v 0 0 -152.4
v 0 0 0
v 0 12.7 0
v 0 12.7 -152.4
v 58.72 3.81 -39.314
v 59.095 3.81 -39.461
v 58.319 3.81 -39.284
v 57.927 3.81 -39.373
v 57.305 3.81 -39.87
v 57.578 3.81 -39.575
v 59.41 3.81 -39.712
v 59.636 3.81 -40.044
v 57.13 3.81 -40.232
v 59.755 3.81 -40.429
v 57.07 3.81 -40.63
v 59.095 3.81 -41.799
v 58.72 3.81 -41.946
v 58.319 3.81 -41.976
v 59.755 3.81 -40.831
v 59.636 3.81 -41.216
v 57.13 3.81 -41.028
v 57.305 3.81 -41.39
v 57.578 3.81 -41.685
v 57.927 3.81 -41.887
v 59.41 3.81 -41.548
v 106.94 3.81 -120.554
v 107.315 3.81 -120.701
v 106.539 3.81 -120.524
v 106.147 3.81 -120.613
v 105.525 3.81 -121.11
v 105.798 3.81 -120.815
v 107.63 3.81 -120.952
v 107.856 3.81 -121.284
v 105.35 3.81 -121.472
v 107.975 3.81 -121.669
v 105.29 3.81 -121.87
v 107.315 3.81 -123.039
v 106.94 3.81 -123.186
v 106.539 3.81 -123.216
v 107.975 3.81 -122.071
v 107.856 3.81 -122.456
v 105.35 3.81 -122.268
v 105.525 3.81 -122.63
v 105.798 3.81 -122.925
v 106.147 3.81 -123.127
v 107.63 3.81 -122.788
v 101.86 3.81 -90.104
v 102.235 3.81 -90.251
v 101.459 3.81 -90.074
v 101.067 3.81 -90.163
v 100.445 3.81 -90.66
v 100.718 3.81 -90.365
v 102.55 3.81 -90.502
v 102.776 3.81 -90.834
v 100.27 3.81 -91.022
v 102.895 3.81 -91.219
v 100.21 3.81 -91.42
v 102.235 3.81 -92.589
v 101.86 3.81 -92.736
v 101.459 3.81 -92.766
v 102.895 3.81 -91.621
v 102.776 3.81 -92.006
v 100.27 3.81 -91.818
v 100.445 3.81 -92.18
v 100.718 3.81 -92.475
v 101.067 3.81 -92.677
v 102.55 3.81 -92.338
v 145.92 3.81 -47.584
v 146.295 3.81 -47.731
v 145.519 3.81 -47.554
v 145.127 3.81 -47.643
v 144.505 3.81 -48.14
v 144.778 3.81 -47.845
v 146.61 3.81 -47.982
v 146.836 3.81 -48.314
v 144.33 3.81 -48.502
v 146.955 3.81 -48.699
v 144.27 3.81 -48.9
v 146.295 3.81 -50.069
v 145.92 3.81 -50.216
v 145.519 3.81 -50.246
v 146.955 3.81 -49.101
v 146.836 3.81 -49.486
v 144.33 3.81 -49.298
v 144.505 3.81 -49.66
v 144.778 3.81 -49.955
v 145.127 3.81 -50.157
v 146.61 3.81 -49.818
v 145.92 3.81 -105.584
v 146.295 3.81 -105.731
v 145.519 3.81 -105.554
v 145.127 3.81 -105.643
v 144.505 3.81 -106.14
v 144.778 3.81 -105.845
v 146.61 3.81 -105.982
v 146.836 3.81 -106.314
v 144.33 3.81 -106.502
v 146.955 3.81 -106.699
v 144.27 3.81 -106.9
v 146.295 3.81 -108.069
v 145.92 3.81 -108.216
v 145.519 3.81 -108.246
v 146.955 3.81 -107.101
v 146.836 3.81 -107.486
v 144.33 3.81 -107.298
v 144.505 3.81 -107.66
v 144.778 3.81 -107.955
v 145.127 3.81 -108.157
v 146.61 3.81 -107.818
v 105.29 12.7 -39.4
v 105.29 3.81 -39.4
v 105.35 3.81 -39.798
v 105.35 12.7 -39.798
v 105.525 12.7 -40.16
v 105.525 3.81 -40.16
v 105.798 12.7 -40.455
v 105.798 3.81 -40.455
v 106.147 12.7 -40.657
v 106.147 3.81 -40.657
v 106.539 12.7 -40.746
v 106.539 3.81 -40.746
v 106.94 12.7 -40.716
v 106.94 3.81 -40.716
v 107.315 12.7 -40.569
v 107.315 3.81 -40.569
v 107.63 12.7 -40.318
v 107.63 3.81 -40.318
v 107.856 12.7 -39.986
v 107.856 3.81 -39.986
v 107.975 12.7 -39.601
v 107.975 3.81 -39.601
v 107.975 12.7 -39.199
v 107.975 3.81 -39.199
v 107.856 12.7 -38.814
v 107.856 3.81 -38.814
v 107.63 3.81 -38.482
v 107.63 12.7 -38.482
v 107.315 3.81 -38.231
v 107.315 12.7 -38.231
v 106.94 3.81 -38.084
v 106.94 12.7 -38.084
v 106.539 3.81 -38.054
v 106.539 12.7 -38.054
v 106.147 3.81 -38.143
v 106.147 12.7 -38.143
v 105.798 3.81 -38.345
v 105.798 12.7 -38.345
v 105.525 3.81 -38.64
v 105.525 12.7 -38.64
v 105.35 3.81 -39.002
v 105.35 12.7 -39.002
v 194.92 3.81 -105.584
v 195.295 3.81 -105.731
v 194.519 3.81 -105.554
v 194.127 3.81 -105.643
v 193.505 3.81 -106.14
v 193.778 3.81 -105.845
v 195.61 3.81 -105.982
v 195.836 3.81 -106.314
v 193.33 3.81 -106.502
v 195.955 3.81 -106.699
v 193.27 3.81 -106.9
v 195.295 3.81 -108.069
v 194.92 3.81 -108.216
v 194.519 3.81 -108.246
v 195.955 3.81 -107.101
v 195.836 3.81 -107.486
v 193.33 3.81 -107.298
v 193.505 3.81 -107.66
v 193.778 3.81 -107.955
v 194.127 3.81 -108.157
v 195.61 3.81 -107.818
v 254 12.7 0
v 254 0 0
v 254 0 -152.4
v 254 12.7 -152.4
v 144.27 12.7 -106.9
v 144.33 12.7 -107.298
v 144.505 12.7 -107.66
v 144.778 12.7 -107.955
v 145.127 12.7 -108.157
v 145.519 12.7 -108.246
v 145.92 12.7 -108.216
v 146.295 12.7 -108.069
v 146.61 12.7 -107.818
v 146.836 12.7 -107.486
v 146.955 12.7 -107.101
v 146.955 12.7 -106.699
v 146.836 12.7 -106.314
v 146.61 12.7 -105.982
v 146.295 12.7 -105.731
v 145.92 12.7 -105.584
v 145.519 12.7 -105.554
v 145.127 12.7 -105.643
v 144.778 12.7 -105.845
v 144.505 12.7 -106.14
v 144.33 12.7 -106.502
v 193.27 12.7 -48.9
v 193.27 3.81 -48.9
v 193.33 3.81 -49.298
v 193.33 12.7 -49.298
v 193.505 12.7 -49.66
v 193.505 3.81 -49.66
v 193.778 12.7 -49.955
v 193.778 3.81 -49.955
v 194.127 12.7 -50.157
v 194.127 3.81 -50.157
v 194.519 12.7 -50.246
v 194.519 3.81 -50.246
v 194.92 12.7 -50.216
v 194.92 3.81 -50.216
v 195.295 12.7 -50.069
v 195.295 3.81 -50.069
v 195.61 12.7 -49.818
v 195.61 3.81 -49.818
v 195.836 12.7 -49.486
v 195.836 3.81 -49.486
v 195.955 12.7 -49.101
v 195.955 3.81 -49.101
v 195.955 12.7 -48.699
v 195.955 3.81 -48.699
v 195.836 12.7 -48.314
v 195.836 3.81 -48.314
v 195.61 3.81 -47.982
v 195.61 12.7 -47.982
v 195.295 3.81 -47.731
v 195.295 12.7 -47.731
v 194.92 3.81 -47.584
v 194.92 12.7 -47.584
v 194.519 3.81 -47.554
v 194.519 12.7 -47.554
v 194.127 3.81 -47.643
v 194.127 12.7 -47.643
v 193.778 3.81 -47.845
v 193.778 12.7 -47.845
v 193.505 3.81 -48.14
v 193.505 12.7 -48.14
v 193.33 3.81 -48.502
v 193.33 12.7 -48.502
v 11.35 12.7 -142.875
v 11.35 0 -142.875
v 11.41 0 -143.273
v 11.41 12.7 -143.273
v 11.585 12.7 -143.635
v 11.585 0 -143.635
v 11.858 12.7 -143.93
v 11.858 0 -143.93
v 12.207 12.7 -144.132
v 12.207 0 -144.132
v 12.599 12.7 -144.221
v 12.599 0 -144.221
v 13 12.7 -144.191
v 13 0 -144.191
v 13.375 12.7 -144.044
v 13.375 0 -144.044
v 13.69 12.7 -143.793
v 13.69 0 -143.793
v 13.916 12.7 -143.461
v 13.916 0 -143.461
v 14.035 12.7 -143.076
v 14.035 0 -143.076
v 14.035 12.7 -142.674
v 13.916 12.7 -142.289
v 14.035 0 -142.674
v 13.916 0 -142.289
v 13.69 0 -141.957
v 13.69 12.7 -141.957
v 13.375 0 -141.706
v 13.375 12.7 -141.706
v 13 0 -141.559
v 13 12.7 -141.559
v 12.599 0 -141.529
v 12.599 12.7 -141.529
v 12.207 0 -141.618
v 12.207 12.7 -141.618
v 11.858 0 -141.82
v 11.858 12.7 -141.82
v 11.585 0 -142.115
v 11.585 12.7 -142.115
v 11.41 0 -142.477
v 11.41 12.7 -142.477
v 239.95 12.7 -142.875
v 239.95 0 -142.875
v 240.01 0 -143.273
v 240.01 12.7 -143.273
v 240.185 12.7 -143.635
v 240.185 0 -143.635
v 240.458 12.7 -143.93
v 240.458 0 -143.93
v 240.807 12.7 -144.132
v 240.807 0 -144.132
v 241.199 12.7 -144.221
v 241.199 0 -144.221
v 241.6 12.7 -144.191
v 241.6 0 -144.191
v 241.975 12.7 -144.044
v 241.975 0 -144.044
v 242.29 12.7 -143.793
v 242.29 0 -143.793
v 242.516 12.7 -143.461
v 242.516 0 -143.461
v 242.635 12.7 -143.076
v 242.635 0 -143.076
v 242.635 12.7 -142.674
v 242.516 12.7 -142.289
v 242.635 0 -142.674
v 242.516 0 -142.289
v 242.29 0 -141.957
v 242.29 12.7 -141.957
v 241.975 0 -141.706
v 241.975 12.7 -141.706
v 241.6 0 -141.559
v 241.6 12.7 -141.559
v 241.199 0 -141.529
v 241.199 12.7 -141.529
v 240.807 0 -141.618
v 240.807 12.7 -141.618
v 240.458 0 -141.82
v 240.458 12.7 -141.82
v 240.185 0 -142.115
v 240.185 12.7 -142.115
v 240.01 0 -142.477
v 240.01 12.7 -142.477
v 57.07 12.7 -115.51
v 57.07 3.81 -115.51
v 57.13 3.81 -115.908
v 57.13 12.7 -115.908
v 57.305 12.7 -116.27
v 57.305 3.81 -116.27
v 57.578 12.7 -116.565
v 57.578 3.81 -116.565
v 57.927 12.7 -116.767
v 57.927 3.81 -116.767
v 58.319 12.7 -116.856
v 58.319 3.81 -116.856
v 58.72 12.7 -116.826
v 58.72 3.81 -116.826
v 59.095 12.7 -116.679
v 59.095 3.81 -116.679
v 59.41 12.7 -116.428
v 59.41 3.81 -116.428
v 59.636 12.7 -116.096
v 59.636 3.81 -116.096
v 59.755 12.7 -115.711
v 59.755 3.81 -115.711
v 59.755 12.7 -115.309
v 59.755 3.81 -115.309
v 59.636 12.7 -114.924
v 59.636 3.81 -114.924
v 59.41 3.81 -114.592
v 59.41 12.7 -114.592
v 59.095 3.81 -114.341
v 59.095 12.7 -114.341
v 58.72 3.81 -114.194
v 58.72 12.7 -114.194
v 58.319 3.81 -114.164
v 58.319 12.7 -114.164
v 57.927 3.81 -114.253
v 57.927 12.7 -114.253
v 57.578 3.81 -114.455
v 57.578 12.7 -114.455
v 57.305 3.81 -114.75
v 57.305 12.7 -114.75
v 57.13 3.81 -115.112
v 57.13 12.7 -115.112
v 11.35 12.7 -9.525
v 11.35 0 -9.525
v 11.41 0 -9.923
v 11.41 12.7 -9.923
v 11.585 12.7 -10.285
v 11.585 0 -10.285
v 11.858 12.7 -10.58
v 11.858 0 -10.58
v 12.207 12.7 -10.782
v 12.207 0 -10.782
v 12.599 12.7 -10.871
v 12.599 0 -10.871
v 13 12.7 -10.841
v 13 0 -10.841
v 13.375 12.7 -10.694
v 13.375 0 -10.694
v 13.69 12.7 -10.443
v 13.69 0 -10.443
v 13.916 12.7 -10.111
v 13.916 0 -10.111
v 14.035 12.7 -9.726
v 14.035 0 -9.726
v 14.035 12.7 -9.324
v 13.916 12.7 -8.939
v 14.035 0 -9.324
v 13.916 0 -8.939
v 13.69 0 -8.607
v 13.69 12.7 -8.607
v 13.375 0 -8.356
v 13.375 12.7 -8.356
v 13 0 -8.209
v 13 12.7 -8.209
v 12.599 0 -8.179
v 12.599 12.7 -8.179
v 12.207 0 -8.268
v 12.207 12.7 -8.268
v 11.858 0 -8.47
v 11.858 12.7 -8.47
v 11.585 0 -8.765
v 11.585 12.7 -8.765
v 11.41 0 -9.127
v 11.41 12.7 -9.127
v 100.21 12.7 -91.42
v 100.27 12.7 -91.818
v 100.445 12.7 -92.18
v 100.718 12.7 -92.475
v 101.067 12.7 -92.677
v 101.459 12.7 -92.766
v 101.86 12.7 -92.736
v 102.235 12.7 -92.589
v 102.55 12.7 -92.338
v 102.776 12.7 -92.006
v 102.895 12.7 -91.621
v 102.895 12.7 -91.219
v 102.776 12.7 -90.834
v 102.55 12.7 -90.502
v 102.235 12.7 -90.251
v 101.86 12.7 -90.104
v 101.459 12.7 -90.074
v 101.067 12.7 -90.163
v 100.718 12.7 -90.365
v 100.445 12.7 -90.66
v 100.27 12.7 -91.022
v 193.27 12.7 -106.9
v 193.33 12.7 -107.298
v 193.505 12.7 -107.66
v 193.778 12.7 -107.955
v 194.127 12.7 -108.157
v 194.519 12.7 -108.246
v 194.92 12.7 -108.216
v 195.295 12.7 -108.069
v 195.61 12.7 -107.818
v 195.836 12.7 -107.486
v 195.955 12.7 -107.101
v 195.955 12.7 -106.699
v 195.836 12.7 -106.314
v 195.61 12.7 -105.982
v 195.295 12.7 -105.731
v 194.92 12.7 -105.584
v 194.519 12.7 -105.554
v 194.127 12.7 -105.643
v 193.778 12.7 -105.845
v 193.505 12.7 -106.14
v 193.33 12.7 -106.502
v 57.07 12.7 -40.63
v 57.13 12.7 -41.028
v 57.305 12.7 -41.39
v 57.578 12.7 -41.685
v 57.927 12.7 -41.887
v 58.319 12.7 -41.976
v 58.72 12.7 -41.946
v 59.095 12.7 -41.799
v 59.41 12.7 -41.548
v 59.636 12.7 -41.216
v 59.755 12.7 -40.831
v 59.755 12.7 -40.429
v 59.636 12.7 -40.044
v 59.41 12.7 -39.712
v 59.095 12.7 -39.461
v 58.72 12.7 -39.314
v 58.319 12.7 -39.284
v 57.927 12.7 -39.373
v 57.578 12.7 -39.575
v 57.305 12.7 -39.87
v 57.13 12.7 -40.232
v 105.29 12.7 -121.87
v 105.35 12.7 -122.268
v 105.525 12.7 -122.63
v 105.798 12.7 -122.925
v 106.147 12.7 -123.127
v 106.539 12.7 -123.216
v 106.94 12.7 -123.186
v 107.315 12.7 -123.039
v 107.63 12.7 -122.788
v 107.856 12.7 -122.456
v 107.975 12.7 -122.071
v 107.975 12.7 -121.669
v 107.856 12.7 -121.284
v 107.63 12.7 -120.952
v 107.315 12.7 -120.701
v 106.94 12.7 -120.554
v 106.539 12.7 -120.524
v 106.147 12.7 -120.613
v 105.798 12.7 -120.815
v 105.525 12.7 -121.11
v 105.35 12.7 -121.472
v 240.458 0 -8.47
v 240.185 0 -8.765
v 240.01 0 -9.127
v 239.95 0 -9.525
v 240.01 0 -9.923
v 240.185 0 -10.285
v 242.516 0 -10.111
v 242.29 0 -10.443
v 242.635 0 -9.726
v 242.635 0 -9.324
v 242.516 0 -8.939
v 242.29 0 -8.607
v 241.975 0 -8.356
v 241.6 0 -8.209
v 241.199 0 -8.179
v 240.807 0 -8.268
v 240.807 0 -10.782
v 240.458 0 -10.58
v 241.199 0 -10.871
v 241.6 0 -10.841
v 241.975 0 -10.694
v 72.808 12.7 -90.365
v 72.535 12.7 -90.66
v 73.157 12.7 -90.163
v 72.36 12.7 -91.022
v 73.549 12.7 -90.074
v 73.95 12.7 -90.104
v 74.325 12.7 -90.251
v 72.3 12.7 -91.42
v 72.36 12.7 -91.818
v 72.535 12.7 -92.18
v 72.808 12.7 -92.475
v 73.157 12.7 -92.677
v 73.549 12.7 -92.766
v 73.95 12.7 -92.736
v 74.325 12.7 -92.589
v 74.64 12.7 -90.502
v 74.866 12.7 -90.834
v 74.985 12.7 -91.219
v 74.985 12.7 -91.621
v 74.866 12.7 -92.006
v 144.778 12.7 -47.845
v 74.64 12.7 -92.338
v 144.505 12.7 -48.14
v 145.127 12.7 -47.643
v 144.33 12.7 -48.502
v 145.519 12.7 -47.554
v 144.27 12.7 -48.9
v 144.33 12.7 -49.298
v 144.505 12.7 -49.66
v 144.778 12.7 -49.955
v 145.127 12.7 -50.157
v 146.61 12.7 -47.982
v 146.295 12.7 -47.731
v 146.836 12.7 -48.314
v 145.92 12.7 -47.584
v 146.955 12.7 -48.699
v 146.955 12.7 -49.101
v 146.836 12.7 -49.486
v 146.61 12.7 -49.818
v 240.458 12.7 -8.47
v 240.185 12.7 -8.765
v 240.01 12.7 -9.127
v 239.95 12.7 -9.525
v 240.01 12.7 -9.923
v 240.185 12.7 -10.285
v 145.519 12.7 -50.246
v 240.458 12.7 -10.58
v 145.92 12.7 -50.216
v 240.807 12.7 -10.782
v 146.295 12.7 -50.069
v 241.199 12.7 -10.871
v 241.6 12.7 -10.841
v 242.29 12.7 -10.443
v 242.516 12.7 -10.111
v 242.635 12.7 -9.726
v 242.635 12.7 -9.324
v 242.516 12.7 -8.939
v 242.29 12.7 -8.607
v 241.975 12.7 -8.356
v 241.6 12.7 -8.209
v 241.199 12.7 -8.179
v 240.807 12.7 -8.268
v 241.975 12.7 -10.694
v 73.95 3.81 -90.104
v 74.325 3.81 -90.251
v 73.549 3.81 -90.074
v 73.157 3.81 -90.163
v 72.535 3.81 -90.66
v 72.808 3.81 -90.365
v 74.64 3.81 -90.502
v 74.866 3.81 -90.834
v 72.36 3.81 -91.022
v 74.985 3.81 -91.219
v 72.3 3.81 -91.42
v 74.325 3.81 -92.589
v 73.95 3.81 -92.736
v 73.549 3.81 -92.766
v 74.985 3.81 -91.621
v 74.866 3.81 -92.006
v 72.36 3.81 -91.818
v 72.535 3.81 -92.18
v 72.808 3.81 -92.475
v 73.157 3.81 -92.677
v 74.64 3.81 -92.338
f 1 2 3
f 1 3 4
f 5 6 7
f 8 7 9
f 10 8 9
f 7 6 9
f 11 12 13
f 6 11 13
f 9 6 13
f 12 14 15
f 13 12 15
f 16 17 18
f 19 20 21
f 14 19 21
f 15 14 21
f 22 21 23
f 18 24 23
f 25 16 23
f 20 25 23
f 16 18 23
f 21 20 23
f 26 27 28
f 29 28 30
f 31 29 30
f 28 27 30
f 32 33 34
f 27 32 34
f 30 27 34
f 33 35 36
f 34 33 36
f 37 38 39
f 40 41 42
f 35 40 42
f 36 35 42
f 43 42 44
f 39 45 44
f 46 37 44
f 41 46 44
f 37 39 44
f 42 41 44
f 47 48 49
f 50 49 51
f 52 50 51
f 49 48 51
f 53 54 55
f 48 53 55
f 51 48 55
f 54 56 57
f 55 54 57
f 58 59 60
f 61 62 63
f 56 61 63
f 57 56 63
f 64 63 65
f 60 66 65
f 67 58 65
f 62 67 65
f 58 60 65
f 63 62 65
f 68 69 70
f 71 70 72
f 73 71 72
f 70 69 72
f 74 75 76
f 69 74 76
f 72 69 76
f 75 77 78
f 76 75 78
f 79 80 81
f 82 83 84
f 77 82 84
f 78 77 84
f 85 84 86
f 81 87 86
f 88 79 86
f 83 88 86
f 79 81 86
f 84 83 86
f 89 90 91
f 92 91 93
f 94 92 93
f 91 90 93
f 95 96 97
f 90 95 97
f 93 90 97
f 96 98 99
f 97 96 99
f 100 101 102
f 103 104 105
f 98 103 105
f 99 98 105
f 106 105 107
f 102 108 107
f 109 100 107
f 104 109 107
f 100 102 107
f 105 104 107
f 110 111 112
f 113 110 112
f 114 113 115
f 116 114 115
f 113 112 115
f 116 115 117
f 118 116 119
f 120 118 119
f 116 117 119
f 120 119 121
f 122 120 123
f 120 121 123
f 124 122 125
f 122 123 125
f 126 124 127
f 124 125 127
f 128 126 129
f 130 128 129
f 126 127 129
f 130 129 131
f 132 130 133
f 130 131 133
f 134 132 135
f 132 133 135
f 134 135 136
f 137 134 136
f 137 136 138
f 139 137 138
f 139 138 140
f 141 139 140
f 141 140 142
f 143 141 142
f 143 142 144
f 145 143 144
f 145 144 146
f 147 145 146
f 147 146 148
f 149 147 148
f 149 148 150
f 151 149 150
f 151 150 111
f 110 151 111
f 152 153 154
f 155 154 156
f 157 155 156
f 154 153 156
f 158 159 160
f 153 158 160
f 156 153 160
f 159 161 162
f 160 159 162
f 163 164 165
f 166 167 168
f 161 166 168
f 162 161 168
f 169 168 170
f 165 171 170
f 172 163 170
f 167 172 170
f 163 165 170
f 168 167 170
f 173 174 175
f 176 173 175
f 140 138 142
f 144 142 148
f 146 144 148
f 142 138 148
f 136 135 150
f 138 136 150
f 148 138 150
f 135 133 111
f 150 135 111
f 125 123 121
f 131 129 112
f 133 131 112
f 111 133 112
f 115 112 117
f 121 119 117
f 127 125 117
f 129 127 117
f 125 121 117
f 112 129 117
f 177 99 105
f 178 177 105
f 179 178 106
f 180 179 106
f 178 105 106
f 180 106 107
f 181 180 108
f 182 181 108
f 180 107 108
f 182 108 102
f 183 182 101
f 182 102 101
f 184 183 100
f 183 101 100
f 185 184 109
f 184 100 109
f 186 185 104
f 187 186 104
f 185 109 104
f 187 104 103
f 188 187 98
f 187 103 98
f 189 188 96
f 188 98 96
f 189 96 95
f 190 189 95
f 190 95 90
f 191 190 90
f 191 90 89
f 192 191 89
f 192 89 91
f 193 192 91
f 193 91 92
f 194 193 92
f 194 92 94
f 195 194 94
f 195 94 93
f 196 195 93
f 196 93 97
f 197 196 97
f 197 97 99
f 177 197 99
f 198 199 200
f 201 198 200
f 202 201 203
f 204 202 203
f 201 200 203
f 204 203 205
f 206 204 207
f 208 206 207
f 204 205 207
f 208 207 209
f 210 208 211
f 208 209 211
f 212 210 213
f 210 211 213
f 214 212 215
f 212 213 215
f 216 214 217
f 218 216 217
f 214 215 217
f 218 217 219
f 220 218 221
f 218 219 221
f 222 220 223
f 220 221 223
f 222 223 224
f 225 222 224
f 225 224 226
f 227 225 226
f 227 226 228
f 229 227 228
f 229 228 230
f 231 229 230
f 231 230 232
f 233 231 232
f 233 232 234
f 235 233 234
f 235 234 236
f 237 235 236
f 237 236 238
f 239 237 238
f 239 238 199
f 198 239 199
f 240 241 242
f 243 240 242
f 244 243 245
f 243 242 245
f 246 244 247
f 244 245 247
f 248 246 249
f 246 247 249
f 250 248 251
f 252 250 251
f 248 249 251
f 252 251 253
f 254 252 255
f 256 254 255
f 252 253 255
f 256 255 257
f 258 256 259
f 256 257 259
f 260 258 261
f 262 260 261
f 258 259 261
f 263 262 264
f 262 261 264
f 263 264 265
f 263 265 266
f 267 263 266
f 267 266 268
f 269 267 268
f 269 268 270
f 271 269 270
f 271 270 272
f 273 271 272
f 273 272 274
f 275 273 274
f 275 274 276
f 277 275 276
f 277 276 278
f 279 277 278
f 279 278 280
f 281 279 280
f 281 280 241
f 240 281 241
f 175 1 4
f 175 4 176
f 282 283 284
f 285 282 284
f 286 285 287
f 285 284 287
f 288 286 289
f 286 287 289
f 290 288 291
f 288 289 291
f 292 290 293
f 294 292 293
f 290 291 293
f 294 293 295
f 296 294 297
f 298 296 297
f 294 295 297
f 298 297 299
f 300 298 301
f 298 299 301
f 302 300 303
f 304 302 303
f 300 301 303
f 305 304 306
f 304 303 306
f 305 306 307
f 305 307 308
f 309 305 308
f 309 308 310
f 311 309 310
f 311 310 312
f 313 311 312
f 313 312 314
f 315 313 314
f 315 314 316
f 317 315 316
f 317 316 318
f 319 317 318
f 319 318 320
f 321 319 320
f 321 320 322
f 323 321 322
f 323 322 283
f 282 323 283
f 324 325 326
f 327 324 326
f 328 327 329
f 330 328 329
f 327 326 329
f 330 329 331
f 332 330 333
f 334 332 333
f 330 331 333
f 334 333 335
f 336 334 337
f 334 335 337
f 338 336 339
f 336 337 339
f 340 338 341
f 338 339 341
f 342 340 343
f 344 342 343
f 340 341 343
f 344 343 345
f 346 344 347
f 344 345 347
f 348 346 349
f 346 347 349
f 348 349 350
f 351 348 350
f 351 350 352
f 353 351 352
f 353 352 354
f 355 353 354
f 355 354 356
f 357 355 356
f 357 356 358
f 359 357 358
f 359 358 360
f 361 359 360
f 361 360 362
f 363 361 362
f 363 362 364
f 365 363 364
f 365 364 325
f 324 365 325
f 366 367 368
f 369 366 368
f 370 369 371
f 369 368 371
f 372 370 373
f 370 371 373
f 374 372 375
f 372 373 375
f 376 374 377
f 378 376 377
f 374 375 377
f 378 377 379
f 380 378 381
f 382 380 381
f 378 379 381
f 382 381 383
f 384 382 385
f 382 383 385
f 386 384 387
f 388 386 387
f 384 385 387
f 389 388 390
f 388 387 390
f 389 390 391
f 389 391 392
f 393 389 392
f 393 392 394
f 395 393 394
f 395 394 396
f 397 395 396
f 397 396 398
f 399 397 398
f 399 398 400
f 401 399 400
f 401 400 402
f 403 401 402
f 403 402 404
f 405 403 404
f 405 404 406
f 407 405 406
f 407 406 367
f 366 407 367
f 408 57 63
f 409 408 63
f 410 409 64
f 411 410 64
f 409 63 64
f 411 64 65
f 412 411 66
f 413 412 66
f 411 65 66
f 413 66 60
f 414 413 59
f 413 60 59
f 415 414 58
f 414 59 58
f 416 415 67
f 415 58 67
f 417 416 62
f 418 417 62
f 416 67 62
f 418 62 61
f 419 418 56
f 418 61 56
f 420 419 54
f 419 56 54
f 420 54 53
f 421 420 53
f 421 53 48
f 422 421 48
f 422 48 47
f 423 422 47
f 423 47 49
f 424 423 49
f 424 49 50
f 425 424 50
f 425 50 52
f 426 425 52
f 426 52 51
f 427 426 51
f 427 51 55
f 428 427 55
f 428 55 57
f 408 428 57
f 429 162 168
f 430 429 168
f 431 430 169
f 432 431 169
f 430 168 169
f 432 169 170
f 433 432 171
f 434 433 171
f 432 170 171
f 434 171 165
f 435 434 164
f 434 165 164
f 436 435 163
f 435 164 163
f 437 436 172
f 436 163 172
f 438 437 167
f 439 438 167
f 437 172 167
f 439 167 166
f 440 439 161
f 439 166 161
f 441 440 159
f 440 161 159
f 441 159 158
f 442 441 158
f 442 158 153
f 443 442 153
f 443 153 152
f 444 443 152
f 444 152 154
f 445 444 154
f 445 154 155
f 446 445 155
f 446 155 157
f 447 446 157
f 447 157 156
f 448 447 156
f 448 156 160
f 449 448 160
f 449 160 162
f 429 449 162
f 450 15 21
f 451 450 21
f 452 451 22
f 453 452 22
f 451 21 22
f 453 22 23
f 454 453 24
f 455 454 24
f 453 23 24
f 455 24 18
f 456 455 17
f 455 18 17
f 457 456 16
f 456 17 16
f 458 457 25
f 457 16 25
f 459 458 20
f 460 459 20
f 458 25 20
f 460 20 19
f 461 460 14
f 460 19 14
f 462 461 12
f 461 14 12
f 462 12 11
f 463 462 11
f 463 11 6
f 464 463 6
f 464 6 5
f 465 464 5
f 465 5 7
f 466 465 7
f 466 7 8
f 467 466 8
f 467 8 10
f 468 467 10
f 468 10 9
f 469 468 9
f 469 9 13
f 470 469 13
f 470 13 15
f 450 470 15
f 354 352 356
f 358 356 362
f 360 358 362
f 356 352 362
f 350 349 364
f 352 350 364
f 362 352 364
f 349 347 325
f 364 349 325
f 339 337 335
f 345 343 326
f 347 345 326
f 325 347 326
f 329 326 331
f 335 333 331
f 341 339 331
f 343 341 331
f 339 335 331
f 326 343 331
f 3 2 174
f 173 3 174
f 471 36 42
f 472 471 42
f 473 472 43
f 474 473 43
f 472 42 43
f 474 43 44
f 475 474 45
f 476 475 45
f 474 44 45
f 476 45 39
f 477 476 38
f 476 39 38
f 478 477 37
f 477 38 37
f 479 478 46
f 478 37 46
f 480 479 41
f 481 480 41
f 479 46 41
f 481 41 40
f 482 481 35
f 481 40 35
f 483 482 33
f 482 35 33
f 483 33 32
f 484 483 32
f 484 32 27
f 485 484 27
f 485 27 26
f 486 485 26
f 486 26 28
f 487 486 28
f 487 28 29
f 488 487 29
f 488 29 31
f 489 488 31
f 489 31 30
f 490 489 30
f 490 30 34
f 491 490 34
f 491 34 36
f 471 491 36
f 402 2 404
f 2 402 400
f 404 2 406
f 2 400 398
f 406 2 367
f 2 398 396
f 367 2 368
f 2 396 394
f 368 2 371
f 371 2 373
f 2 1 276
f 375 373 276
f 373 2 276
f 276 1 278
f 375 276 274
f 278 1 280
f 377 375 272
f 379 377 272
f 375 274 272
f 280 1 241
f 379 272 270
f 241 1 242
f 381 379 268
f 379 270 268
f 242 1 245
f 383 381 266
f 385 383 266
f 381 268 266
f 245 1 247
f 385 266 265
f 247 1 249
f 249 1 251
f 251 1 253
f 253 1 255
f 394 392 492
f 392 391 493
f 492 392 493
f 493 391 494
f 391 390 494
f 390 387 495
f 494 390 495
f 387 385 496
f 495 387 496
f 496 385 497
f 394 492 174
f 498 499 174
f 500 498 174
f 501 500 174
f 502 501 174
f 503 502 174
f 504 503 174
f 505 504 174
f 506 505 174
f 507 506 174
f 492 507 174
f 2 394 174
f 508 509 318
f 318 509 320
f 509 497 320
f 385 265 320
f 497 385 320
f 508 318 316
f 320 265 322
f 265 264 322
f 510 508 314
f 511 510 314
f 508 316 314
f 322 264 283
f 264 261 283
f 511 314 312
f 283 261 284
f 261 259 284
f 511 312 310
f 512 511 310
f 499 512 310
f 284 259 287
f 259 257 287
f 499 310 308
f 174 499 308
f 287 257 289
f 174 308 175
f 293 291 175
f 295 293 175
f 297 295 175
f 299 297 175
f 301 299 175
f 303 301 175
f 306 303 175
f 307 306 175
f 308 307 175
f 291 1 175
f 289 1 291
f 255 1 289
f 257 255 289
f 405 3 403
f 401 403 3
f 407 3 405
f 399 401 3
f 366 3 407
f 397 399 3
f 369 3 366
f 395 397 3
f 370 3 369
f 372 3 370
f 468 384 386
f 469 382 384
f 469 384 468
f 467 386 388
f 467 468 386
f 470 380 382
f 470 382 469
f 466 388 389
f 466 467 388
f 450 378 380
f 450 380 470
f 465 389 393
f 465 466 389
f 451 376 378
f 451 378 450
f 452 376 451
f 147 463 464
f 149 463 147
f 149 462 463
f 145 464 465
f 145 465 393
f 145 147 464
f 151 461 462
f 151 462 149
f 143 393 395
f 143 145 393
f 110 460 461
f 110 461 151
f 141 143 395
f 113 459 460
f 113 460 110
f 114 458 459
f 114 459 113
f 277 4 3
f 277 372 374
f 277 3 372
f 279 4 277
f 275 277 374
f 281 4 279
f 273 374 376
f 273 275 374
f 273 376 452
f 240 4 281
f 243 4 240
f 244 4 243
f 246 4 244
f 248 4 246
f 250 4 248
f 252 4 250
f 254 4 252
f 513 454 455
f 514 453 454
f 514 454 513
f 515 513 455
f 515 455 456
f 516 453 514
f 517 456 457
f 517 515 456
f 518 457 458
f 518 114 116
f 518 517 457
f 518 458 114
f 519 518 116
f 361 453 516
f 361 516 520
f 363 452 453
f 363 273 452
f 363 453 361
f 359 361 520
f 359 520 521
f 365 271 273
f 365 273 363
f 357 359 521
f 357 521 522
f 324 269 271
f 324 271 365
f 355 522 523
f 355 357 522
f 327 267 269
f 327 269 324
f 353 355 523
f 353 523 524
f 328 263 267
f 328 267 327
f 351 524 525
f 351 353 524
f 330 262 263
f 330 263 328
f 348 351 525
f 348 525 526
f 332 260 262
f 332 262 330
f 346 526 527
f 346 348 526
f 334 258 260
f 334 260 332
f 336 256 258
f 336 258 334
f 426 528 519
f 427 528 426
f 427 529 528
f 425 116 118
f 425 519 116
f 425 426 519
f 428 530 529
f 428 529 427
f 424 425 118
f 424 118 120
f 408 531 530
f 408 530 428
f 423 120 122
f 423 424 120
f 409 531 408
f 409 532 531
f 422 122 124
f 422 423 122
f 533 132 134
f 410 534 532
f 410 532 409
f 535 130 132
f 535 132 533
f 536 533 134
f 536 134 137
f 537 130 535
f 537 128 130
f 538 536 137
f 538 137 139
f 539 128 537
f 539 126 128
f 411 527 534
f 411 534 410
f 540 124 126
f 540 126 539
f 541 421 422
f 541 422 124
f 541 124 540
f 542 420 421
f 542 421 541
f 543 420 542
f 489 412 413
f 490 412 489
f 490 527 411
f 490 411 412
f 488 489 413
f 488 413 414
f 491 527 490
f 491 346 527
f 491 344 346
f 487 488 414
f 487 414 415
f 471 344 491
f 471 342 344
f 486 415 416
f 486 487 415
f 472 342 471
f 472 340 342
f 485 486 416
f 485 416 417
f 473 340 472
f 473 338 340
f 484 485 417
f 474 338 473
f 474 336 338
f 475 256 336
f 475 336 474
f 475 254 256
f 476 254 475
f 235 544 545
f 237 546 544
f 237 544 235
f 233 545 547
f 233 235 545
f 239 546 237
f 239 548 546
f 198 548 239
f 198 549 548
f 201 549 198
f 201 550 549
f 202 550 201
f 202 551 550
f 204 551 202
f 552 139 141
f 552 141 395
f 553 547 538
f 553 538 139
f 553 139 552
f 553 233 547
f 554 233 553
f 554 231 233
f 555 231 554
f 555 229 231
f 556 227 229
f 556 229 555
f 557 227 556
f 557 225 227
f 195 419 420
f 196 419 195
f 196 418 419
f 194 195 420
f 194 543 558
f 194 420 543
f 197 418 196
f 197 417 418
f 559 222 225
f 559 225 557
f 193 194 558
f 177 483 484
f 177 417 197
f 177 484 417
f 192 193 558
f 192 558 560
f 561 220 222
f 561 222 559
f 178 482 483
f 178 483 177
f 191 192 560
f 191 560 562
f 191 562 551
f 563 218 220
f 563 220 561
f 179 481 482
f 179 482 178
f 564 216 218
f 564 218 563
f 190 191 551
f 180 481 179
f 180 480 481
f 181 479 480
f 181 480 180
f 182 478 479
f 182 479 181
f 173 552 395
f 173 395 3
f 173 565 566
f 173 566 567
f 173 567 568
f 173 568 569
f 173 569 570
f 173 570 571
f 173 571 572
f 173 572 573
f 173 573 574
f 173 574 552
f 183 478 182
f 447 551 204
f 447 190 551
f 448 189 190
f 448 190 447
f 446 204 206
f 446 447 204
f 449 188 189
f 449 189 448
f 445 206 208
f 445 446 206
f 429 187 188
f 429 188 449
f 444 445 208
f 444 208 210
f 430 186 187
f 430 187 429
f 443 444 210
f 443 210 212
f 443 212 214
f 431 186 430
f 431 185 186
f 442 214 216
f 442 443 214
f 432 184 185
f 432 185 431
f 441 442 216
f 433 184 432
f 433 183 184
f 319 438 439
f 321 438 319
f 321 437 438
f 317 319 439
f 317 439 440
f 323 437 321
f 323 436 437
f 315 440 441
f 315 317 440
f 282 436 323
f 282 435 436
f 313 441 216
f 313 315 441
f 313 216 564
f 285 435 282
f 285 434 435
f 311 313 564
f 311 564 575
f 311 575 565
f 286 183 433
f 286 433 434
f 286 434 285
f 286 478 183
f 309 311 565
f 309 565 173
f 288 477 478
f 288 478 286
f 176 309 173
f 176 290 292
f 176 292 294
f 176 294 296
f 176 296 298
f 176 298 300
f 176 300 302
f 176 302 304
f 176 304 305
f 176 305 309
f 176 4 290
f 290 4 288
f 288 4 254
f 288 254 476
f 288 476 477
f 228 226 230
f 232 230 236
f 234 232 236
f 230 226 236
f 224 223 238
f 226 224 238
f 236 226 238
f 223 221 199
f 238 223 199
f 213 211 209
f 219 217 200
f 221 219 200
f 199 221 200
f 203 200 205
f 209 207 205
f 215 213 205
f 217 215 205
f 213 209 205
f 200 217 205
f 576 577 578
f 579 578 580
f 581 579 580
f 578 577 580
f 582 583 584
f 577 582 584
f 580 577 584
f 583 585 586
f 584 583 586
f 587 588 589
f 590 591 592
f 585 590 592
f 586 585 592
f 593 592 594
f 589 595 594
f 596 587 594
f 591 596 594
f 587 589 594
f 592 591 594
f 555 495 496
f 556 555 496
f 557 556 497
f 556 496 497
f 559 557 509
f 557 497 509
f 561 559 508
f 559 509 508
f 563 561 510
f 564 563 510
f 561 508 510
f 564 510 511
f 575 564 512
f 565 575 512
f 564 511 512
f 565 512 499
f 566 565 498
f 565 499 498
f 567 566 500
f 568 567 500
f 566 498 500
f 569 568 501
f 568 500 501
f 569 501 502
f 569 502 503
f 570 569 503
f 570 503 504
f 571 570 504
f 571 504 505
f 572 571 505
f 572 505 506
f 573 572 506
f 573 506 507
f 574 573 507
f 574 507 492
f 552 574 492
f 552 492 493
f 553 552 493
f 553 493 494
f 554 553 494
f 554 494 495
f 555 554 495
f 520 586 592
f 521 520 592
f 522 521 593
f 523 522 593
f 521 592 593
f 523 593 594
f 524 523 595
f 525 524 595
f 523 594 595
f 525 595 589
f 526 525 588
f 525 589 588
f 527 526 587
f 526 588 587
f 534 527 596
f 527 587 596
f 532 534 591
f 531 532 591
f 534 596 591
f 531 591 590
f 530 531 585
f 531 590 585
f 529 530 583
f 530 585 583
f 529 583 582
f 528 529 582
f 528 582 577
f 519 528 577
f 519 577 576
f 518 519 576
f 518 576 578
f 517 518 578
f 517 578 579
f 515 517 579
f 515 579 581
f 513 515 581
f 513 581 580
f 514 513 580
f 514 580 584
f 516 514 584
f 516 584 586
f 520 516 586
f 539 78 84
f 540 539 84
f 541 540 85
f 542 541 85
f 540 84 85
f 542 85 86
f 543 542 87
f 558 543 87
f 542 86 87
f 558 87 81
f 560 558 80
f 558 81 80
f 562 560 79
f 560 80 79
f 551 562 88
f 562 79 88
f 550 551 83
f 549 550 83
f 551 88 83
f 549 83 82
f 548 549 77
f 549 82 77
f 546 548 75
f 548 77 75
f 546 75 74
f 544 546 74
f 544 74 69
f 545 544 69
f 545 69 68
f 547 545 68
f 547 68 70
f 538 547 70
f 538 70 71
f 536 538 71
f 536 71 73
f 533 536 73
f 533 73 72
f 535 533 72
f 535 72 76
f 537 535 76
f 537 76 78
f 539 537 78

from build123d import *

# Parameters (mm, degrees)
ESQUISSE1_W            = 254
ESQUISSE1_H            = 152.4
BOSS_EXTRU_1_DEPTH     = 12.7
D_GAGEMENT_M2_51_D     = 2.7
D_GAGEMENT_M2_51_DEPTH = 8.89
D_GAGEMENT_M2_52_D     = 2.7
D_GAGEMENT_M2_52_DEPTH = 95.25


with BuildPart() as part:
    # Esquisse1 → Boss.-Extru.1 (new body)
    with BuildSketch(Plane(origin=(0, 0, 0), x_dir=(1, 0, 0), z_dir=(0, 1, 0))):
        with Locations((127, 76.2)):
            Rectangle(ESQUISSE1_W, ESQUISSE1_H)
    extrude(amount=BOSS_EXTRU_1_DEPTH)

    # Dégagement M2.51
    with Locations(Plane(origin=(0, 12.7, 0), x_dir=(1, 0, 0), z_dir=(0, 1, 0))):
        with Locations((194.619999888, 48.9), (194.619999888, 106.9), (145.619999888, 106.9), (145.619999888, 48.9), (106.64, 121.87), (58.42, 115.51), (101.56, 91.42), (73.65, 91.42), (58.42, 40.63), (106.64, 39.4)):
            Hole(D_GAGEMENT_M2_51_D / 2, depth=D_GAGEMENT_M2_51_DEPTH)

    # Dégagement M2.52
    with Locations(Plane(origin=(0, 12.7, 0), x_dir=(1, 0, 0), z_dir=(0, 1, 0))):
        with Locations((12.7, 9.525), (241.3, 9.525), (241.3, 142.875), (12.7, 142.875)):
            Hole(D_GAGEMENT_M2_52_D / 2, depth=D_GAGEMENT_M2_52_DEPTH)


solid = part.part
